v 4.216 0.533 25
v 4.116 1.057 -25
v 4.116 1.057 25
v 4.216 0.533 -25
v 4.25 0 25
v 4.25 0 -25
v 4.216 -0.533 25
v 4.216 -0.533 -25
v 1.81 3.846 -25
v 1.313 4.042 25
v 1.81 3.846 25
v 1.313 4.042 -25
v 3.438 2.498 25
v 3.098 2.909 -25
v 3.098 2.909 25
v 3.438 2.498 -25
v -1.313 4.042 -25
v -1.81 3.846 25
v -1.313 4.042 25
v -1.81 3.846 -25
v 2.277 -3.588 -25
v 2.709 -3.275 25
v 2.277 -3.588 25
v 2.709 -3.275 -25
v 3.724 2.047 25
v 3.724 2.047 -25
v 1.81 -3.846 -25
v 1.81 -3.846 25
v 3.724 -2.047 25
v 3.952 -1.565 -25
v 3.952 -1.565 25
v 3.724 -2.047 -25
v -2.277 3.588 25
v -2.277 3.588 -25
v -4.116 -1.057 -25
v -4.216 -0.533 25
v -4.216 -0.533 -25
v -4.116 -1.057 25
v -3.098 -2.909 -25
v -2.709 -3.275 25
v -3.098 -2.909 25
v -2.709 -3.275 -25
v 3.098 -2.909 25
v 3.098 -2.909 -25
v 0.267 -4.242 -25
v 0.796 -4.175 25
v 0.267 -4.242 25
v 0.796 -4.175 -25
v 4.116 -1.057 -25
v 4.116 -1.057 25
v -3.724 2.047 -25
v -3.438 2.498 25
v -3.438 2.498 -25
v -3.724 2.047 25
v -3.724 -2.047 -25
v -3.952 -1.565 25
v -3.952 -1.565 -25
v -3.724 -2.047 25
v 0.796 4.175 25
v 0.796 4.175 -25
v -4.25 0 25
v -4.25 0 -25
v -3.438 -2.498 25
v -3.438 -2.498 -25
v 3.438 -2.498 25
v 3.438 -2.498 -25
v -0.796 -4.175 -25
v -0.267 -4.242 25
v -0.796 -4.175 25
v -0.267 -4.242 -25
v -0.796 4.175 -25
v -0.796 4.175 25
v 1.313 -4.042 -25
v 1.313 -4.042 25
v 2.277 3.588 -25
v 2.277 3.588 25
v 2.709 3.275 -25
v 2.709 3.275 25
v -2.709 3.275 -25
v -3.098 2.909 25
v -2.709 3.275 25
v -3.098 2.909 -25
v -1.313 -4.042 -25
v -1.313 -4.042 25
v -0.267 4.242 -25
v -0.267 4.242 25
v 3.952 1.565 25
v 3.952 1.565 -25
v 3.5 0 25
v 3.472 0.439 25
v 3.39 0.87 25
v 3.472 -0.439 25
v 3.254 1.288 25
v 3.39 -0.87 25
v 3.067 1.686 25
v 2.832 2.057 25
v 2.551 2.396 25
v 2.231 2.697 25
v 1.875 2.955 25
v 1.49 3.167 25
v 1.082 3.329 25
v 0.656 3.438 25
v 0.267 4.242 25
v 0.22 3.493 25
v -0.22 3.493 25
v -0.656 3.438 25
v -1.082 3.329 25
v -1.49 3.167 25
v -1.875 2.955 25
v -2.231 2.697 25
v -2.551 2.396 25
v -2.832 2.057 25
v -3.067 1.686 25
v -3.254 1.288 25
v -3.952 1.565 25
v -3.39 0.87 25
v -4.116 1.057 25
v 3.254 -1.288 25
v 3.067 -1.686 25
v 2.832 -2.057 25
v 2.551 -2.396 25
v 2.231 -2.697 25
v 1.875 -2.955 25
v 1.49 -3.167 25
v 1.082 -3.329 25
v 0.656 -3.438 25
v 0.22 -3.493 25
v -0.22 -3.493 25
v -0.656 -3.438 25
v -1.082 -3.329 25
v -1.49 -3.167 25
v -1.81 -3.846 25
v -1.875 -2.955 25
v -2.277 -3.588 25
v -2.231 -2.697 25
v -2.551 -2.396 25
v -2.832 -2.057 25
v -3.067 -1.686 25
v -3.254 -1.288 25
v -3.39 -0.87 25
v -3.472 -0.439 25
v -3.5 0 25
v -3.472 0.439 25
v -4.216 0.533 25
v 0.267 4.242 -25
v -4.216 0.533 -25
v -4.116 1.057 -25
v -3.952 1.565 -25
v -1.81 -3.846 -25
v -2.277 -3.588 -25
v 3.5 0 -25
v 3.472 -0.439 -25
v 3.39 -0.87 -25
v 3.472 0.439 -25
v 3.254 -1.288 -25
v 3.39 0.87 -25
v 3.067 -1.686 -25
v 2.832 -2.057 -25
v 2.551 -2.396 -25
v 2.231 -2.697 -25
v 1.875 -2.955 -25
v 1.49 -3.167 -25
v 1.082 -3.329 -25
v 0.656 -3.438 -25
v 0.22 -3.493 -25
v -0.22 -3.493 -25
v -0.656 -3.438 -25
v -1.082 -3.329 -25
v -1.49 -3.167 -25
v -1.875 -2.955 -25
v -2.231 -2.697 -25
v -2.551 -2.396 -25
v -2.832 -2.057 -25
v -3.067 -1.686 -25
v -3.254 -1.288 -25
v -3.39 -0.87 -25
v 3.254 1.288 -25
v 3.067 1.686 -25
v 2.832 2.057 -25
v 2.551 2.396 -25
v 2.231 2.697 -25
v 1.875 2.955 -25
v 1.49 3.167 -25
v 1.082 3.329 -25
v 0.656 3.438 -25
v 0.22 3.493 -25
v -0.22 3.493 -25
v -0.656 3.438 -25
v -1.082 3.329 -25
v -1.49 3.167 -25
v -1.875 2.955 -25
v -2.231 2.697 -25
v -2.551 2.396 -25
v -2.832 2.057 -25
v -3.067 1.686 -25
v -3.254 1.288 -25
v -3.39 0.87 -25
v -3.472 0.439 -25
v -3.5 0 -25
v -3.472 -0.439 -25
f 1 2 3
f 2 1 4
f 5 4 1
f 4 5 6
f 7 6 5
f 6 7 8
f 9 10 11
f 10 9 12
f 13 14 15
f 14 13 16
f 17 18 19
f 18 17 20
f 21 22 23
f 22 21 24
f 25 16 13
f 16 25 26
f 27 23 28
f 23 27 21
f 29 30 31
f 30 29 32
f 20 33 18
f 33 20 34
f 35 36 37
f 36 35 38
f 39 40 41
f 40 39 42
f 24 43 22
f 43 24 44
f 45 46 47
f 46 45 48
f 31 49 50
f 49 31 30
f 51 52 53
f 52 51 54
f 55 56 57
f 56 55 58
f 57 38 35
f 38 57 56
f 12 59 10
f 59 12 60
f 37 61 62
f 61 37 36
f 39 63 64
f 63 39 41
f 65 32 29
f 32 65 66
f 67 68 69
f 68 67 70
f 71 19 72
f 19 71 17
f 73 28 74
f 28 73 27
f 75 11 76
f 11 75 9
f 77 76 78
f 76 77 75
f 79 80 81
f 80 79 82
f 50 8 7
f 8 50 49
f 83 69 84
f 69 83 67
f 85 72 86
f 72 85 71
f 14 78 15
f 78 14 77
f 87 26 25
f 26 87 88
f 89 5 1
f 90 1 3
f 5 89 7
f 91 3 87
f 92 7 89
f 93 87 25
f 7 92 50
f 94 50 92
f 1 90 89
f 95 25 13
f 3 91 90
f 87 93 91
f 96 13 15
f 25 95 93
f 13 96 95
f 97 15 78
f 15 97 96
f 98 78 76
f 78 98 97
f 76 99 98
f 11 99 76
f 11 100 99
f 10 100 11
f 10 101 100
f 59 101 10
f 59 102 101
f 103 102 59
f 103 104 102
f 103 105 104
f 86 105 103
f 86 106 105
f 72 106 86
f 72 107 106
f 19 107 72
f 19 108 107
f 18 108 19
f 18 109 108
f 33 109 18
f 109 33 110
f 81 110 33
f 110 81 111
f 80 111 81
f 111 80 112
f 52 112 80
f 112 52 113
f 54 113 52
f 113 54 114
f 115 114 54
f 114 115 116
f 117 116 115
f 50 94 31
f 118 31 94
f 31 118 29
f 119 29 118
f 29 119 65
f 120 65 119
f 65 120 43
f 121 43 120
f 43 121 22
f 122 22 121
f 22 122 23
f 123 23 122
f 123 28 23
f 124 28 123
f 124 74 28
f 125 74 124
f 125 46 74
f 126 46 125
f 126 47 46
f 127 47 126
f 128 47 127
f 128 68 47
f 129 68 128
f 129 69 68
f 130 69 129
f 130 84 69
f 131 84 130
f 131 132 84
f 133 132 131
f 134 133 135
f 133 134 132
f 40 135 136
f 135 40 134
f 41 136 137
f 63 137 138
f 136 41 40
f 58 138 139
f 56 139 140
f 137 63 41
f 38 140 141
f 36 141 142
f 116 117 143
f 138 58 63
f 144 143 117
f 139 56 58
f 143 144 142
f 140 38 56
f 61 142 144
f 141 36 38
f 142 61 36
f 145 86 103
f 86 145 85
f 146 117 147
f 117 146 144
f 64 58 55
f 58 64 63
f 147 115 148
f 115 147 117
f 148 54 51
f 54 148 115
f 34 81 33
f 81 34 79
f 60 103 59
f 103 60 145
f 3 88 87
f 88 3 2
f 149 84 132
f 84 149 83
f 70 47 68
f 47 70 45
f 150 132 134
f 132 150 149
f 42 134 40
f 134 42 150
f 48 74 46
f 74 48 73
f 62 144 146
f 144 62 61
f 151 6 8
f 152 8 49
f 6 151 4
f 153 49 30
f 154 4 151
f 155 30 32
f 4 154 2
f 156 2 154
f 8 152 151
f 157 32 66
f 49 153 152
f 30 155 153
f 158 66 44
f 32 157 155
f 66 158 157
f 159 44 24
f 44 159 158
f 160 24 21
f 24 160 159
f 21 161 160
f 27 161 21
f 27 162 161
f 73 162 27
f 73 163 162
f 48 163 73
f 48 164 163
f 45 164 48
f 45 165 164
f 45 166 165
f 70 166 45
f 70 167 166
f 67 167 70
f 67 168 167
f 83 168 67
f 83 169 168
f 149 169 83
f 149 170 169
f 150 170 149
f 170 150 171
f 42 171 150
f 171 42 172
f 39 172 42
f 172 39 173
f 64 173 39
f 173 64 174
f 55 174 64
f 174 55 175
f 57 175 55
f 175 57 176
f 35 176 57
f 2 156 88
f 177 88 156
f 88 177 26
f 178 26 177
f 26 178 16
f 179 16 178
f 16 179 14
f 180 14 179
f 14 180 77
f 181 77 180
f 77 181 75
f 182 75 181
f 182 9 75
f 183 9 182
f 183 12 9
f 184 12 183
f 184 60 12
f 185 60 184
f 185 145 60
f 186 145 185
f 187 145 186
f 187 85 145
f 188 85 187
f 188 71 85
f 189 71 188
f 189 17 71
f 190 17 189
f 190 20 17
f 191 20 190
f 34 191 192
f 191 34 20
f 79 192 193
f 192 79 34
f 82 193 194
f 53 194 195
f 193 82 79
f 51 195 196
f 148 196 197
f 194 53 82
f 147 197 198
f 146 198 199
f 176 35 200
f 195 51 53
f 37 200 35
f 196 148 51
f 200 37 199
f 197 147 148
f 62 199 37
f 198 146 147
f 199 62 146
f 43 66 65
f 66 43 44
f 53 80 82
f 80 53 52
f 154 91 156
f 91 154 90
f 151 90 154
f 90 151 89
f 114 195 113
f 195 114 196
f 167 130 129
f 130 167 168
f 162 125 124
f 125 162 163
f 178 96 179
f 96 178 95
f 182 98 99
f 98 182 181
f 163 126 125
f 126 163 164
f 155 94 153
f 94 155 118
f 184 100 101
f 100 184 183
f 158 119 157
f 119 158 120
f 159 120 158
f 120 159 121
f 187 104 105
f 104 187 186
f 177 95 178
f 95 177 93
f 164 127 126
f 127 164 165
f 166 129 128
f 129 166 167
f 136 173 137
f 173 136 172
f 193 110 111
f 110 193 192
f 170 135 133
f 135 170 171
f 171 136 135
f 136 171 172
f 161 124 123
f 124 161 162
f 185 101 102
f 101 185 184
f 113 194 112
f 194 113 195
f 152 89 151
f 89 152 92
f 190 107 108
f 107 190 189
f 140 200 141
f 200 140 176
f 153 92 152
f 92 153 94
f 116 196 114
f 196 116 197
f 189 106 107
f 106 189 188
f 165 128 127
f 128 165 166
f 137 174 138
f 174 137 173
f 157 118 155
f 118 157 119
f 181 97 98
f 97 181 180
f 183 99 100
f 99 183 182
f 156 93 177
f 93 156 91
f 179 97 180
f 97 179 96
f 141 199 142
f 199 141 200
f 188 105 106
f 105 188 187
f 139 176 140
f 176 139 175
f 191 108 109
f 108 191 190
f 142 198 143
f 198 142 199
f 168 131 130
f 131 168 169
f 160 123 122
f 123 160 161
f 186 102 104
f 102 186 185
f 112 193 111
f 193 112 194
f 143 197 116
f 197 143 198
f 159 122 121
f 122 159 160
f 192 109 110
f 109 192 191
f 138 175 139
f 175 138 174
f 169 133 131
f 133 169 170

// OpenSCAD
$fn = 50;


difference() {
	union() {
		translate(v = [0, 0, -25.0000000000]) {
			cylinder(h = 50, r = 4.2500000000);
		}
	}
	union() {
		translate(v = [0, 0, -100.0000000000]) {
			cylinder(h = 200, r = 3.5000000000);
		}
	}
}
